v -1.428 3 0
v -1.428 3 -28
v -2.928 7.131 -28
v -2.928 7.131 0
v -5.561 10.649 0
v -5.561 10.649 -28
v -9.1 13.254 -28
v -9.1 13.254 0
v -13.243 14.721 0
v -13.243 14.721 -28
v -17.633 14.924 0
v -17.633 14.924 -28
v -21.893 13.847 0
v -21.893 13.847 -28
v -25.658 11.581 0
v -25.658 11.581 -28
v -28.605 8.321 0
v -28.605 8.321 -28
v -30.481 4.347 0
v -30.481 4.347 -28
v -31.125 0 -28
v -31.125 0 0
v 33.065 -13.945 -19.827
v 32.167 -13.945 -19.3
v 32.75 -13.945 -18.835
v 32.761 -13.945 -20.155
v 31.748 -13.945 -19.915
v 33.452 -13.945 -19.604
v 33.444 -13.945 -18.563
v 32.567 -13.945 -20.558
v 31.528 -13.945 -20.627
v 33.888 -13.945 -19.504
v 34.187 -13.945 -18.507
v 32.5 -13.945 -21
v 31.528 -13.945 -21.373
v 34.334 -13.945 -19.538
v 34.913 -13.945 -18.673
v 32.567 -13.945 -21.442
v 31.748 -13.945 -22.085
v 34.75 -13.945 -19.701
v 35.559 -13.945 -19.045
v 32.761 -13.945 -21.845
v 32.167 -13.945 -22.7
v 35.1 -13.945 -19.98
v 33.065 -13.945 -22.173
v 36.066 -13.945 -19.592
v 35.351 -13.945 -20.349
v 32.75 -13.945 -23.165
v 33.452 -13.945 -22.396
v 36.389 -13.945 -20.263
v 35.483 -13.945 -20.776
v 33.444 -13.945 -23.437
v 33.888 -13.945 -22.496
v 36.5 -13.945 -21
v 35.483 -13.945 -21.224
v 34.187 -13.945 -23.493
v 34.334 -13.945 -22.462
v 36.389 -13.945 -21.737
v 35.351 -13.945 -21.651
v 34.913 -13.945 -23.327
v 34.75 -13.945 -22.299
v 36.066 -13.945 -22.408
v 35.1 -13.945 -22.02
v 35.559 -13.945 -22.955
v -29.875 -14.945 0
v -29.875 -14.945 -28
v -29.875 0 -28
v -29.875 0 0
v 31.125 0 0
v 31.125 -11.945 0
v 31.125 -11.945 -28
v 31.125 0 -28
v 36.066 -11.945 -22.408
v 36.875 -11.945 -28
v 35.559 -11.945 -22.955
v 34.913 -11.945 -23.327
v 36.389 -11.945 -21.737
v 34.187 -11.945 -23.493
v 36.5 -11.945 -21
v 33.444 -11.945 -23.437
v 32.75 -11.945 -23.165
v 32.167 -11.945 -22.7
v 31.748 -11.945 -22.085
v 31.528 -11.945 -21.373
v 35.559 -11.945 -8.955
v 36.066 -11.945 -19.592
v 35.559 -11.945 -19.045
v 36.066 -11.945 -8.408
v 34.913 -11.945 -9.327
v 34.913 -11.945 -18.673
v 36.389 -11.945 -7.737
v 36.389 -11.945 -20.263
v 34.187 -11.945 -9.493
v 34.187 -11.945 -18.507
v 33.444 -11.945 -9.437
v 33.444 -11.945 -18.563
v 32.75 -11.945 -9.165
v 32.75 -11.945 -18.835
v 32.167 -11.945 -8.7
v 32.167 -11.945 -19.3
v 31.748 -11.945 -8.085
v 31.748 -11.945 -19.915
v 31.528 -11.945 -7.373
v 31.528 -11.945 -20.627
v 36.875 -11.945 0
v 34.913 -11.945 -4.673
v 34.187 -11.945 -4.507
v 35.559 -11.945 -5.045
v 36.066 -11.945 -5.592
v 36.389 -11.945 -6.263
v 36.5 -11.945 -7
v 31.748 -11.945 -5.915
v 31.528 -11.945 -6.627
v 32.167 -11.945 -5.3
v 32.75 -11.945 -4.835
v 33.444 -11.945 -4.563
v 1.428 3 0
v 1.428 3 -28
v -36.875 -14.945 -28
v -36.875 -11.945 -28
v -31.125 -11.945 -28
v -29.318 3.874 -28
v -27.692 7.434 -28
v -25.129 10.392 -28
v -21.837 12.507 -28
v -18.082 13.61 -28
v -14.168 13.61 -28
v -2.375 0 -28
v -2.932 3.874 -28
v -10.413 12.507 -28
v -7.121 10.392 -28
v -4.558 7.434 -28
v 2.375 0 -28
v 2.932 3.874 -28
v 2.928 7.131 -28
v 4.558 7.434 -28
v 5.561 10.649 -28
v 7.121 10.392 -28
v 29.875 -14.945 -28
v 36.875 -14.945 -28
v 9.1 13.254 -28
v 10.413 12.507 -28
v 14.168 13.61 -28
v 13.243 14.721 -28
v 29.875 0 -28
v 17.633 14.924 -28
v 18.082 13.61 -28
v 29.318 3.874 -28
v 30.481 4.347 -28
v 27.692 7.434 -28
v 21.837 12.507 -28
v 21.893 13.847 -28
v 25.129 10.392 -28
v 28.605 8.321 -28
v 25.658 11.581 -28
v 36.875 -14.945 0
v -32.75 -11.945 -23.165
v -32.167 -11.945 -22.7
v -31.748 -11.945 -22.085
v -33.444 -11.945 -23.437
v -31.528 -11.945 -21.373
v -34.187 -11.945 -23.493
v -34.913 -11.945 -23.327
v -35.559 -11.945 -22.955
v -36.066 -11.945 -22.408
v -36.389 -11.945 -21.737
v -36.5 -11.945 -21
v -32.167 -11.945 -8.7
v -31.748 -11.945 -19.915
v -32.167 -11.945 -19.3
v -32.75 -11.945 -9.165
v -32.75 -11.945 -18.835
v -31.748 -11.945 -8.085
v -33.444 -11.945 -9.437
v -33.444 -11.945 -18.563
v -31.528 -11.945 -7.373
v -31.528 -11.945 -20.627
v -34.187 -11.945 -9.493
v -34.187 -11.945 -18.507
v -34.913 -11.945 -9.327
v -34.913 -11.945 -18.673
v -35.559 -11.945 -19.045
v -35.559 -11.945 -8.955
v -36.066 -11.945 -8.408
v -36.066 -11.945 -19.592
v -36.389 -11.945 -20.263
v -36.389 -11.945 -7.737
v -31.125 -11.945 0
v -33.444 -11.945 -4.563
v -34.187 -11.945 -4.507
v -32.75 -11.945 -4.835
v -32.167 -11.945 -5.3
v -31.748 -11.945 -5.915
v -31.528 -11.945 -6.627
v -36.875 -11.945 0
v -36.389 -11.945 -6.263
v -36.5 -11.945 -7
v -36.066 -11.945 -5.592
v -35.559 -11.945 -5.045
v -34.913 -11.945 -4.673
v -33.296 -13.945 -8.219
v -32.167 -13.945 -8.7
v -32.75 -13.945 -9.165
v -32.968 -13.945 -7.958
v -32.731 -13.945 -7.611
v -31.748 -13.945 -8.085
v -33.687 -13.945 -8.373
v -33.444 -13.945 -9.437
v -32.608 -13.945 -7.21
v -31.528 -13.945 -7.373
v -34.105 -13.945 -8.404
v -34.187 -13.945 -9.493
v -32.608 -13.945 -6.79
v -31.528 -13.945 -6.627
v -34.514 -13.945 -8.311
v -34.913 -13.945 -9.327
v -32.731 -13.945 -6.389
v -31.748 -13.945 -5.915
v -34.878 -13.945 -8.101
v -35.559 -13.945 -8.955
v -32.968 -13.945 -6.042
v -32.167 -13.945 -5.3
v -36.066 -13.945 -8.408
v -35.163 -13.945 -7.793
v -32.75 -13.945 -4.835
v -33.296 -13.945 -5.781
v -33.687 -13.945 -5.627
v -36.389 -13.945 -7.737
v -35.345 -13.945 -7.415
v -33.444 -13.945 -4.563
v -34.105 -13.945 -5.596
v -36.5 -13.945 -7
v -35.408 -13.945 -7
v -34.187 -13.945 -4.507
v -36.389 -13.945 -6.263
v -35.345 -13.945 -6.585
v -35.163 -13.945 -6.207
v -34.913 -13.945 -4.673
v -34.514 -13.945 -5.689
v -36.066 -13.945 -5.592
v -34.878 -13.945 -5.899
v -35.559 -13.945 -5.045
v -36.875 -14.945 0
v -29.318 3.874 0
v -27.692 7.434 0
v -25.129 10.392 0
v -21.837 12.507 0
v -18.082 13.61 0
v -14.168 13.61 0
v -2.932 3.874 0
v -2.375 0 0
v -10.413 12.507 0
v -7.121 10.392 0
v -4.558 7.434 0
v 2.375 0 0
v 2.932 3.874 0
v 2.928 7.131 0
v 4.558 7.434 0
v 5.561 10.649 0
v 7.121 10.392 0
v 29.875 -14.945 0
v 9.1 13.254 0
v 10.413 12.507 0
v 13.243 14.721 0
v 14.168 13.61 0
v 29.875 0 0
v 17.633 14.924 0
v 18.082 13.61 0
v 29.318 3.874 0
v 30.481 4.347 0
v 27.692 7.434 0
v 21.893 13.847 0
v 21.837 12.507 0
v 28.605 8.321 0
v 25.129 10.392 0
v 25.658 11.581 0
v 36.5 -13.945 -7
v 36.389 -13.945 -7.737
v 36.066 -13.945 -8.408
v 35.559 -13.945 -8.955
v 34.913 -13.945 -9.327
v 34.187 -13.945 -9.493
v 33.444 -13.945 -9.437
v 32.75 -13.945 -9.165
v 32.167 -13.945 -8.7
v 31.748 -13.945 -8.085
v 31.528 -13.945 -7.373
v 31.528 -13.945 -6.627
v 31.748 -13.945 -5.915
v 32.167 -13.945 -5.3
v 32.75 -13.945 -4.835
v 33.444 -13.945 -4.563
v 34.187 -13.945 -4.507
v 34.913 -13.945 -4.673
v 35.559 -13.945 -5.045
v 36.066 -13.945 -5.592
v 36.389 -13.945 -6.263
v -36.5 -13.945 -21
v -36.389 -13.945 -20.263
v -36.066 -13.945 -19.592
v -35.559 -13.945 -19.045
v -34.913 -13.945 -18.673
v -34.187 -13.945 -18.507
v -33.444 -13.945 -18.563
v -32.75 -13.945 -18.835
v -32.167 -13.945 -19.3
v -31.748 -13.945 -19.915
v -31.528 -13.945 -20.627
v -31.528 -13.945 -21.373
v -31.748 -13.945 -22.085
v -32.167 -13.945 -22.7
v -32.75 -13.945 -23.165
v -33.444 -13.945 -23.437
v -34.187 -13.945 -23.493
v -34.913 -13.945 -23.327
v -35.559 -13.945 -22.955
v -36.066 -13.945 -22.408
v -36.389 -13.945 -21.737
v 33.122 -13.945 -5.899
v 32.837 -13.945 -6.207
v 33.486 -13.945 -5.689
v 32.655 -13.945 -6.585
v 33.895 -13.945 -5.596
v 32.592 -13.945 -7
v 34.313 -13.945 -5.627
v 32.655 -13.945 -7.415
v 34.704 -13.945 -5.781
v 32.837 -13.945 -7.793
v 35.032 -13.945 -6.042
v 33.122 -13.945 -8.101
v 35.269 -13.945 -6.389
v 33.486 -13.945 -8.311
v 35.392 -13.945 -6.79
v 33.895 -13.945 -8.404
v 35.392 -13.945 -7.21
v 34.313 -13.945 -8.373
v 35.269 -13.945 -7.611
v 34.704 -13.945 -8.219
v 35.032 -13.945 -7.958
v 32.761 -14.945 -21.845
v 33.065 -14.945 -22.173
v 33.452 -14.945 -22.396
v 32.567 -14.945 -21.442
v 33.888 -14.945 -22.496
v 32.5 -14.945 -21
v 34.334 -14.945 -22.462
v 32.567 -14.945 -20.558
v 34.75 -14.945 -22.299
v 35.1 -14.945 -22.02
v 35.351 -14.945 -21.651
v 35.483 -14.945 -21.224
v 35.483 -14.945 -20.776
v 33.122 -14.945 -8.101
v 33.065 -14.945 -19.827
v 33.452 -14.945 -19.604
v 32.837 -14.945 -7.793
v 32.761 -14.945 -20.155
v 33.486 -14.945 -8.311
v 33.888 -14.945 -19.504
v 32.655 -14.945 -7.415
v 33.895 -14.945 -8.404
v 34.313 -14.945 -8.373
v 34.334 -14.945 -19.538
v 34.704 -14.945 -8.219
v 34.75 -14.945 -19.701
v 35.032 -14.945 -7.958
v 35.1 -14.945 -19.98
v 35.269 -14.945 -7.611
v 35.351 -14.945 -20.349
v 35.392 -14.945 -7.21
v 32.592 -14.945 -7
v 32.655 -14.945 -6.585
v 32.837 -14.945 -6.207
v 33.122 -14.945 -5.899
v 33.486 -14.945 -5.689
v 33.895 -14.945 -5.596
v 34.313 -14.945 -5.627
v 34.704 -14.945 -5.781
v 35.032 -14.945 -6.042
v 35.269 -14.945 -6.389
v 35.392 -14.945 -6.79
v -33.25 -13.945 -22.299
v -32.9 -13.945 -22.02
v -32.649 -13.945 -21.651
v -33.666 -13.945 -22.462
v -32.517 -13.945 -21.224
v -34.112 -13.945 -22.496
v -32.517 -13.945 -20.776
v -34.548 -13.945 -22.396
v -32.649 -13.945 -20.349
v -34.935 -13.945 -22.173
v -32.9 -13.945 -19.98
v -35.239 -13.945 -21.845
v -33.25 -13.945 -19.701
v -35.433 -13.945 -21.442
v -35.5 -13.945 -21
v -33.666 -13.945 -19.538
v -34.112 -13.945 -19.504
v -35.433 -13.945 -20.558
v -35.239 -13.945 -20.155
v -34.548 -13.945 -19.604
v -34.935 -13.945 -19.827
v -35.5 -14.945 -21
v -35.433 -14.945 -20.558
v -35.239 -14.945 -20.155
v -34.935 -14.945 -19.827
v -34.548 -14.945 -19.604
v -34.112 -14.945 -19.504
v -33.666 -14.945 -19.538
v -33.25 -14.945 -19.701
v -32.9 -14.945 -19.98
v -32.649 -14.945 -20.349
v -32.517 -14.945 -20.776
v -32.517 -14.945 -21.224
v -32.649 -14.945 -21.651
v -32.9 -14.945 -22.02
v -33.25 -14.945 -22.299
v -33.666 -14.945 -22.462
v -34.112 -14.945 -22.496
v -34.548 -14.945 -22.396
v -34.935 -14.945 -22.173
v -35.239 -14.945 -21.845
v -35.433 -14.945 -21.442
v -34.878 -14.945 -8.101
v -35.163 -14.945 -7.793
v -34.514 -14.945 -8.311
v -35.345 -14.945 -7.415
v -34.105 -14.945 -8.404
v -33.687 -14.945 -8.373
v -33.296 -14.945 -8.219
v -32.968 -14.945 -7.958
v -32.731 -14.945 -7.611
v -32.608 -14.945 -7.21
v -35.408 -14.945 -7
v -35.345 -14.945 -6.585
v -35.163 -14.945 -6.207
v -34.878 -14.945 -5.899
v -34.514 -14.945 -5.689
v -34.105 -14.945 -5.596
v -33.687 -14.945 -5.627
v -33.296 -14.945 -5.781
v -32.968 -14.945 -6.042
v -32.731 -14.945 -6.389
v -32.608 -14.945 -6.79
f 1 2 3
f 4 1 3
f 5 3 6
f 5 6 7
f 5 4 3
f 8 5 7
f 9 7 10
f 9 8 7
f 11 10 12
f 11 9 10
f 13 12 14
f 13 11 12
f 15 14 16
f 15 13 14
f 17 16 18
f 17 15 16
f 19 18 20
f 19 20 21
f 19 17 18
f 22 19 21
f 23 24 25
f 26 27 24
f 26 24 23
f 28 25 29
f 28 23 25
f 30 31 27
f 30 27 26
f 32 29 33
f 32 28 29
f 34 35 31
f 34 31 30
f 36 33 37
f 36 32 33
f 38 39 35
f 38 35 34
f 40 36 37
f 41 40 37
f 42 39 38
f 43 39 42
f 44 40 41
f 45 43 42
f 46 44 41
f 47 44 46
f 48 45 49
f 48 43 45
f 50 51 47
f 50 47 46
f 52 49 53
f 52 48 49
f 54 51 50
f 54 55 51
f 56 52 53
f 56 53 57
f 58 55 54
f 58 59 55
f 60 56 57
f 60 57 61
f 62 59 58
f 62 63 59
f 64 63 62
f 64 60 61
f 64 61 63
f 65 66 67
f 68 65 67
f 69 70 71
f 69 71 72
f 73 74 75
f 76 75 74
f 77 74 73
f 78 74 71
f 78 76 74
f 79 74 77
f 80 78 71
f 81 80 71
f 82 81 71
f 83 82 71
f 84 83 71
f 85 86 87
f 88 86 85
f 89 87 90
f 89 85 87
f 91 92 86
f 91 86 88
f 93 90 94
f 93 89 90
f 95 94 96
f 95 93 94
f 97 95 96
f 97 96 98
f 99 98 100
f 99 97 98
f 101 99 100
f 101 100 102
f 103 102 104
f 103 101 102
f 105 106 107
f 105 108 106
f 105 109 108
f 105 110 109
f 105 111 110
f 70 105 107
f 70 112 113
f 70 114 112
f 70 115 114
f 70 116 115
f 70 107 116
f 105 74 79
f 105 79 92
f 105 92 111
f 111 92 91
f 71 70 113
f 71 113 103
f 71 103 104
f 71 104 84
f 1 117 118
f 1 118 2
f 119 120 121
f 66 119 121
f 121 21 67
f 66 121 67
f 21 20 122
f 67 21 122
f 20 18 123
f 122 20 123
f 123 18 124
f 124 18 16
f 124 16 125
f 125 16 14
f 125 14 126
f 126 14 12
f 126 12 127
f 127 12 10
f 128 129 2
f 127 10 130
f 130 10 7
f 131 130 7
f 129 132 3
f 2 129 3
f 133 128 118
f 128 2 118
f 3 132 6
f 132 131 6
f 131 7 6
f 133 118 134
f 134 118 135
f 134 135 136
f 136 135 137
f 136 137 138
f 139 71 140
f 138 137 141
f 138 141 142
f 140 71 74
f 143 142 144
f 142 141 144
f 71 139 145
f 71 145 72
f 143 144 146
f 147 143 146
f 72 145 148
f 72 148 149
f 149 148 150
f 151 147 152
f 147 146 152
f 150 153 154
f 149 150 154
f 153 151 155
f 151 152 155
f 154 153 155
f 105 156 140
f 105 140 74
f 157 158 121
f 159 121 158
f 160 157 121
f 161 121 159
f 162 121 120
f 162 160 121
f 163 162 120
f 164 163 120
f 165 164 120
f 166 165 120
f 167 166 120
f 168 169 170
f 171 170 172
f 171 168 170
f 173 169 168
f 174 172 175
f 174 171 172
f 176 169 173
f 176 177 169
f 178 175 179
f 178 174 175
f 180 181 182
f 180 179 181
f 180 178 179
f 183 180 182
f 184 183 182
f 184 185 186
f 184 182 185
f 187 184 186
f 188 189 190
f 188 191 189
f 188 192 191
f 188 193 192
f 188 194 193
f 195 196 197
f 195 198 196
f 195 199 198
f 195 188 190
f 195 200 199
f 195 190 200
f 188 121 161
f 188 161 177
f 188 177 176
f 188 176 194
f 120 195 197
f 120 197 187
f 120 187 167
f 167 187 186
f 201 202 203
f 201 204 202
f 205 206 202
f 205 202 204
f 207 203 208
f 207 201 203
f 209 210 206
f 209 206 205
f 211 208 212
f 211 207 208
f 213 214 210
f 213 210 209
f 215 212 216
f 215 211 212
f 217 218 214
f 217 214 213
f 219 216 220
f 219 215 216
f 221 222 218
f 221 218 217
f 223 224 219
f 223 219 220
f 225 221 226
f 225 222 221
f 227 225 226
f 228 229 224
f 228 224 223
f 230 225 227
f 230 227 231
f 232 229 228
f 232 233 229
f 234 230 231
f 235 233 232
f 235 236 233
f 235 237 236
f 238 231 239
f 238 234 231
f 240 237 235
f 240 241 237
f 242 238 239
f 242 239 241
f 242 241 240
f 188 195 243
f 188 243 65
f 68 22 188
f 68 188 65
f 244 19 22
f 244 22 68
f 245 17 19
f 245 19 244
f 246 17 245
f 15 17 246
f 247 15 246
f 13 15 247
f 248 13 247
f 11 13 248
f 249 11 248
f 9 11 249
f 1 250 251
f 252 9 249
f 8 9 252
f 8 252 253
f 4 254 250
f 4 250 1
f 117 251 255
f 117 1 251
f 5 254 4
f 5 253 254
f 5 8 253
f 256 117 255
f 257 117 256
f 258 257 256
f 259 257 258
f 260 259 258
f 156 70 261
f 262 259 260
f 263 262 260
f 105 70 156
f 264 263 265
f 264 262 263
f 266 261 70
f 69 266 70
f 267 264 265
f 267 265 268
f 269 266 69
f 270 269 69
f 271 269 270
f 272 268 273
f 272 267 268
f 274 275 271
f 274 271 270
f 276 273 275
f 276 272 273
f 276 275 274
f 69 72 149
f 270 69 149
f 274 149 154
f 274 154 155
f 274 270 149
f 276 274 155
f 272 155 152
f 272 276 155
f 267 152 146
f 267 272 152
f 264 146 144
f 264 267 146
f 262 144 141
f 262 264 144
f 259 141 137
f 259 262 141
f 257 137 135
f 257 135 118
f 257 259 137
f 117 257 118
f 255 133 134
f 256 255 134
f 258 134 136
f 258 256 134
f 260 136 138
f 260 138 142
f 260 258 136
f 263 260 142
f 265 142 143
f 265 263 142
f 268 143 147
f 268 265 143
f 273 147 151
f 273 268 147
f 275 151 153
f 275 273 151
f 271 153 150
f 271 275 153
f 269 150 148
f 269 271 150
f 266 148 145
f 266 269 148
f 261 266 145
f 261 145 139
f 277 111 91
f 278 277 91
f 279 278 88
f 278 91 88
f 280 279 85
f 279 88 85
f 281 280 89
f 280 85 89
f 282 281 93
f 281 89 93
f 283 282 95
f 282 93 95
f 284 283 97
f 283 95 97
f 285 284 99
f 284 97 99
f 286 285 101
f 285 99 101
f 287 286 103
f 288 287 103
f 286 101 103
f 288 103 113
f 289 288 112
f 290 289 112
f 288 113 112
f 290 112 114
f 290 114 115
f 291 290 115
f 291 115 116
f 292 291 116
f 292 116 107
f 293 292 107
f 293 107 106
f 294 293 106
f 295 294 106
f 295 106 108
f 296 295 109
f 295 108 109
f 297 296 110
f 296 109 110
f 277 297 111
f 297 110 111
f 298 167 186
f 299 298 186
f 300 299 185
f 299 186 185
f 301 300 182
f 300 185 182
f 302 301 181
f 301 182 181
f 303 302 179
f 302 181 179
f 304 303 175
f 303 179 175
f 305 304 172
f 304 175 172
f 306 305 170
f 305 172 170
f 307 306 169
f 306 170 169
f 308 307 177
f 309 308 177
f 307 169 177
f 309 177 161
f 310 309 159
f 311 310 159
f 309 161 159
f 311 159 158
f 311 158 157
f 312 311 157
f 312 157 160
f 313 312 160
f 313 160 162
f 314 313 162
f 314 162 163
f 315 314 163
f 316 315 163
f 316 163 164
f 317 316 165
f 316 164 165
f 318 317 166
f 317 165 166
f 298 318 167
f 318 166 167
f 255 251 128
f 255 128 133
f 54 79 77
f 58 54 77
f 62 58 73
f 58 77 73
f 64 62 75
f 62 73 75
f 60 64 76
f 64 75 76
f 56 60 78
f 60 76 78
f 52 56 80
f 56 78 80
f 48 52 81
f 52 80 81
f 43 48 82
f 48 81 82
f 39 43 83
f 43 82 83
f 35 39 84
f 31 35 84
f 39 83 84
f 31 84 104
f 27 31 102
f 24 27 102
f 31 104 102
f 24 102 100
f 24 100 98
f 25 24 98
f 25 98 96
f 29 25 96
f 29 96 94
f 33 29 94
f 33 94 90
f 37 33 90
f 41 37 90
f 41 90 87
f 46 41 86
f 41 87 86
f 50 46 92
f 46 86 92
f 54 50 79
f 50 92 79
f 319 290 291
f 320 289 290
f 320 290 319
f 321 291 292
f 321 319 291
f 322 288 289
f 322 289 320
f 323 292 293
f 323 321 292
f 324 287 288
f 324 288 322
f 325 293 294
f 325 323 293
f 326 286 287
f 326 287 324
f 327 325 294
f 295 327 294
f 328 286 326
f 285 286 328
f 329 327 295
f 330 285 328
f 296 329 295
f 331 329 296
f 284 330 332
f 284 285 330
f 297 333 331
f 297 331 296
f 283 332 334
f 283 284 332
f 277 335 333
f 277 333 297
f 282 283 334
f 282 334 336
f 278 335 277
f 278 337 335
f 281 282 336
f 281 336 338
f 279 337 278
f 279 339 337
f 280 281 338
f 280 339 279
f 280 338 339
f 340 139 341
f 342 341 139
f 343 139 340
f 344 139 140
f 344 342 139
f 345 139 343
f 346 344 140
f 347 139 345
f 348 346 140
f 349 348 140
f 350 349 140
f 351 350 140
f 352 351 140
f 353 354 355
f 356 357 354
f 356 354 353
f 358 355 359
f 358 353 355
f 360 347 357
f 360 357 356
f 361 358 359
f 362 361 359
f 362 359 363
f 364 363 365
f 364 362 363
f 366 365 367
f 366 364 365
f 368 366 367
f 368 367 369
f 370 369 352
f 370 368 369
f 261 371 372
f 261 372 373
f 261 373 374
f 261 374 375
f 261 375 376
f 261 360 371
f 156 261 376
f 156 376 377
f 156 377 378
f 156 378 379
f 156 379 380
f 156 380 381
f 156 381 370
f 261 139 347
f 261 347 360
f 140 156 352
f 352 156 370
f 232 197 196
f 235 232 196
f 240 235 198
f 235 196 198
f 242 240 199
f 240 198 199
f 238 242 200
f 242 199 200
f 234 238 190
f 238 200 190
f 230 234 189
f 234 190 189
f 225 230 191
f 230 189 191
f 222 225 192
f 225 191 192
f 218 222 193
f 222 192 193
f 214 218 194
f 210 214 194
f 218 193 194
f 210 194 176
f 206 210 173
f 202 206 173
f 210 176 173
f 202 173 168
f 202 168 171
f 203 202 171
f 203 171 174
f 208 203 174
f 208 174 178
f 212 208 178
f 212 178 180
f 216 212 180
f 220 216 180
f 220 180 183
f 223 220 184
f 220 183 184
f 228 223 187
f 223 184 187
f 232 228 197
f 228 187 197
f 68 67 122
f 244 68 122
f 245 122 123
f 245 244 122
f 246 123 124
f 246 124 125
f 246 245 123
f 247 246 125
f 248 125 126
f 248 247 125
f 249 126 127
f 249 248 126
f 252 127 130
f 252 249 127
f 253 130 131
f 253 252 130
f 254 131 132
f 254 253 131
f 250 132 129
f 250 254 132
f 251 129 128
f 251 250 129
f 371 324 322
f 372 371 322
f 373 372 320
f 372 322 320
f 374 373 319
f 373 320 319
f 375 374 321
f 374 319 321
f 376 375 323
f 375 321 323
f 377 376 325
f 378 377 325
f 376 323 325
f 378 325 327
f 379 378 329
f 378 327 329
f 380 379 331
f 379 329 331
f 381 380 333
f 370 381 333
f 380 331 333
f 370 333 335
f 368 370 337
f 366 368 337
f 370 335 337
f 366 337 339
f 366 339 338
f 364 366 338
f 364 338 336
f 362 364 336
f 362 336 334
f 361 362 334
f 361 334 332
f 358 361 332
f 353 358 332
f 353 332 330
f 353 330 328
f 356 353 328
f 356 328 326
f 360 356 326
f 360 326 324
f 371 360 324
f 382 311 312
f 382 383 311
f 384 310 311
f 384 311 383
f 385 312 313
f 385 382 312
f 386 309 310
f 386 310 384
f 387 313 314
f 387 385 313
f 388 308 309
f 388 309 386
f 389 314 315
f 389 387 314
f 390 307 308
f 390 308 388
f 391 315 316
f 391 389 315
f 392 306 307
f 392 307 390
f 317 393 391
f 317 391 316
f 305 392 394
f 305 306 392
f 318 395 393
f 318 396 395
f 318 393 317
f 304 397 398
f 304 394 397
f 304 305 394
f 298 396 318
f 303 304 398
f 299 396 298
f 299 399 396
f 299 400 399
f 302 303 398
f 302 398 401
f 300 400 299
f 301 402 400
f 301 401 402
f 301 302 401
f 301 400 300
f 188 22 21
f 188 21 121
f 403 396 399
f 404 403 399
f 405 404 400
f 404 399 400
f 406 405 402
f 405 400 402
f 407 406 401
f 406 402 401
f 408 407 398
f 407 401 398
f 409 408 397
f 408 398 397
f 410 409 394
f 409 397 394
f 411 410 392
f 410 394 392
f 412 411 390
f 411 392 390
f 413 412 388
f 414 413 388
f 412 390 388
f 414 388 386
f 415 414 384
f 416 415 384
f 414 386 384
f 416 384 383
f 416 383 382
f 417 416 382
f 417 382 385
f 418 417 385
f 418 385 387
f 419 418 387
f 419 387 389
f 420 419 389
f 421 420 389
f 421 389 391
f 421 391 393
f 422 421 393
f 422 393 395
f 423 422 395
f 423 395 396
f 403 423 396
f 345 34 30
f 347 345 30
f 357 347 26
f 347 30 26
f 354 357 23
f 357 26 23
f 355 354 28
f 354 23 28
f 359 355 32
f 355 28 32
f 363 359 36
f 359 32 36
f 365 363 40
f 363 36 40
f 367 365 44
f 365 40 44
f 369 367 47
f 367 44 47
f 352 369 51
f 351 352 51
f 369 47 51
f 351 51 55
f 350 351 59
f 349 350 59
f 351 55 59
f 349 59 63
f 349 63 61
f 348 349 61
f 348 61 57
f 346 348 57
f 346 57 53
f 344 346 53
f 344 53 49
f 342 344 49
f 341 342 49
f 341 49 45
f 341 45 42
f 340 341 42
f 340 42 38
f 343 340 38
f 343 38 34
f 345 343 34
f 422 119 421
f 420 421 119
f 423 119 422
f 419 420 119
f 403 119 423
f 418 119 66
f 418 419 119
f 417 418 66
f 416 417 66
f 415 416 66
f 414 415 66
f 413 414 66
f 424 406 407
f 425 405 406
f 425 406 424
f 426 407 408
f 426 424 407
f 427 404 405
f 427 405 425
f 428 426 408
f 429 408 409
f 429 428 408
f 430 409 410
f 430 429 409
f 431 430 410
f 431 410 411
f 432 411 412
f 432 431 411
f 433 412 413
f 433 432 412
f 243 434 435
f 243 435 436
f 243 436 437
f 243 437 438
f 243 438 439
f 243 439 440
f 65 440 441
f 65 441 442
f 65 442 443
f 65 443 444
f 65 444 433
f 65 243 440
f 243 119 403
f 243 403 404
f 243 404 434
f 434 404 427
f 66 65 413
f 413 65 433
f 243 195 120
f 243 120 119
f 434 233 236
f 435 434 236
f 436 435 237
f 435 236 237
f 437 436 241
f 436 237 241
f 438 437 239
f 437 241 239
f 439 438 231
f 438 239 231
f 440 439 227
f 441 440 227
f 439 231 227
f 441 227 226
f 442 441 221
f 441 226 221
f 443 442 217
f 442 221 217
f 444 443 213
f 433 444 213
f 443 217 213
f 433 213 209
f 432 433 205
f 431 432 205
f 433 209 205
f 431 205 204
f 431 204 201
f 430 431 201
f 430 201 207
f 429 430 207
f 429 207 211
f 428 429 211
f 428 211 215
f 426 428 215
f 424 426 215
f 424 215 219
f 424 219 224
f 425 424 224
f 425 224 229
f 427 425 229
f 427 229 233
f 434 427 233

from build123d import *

# Parameters (mm, degrees)
SALIENTE_EXTRUIR1_DEPTH = 28
CROQUIS2_R              = 2.5
CROQUIS2_R_2            = 1.5
CROQUIS2_R_3            = 1.407949101
CORTAR_EXTRUIR1_DEPTH   = 2
CROQUIS3_R              = 1.407949101
CROQUIS3_R_2            = 1.5
CORTAR_EXTRUIR2_DEPTH   = 54.570618198
CROQUIS4_R              = 1.407949101
CROQUIS4_R_2            = 1.5
CORTAR_EXTRUIR3_DEPTH   = 54.570618198


with BuildPart() as part:
    # Croquis1 → Saliente-Extruir1 (new body)
    with BuildSketch(Plane.XY):
        with BuildLine():
            ThreePointArc((-29.875, 0), (-16.125, 13.75), (-2.375, 0))
            Line((-2.375, 0), (-1.125, 0))
            Line((-1.125, 0), (1.125, 0))
            Line((1.125, 0), (2.375, 0))
            ThreePointArc((2.375, 0), (16.125, 13.75), (29.875, 0))
            Line((29.875, 0), (29.875, -9.945231658))
            Line((29.875, -9.945231658), (29.875, -14.945231658))
            Line((29.875, -14.945231658), (36.875, -14.945231658))
            Line((36.875, -14.945231658), (36.875, -11.945231658))
            Line((36.875, -11.945231658), (31.125, -11.945231658))
            Line((31.125, -11.945231658), (31.125, 0))
            ThreePointArc((31.125, 0), (17.63263443, 14.924042295), (1.428061543, 3))
            Line((1.428061543, 3), (-1.428061543, 3))
            ThreePointArc((-1.428061543, 3), (-17.63263443, 14.924042295), (-31.125, 0))
            Line((-31.125, 0), (-31.125, -11.945231658))
            Line((-31.125, -11.945231658), (-36.875, -11.945231658))
            Line((-36.875, -11.945231658), (-36.875, -14.945231658))
            Line((-36.875, -14.945231658), (-29.875, -14.945231658))
            Line((-29.875, -14.945231658), (-29.875, -9.945231658))
            Line((-29.875, -9.945231658), (-29.875, 0))
        make_face()
    extrude(amount=-SALIENTE_EXTRUIR1_DEPTH)

    # Croquis2 → Cortar-Extruir1 (cut)
    # profile 1 of 4: a face of its own
    with BuildSketch(Plane(origin=(0, -11.945231658, 0), x_dir=(1, 0, 0), z_dir=(0, 1, 0))):
        with Locations(Location((-34, 21, 0), (0, 0, 180))):
            Circle(CROQUIS2_R)
        with Locations(Location((-34, 21, 0), (0, 0, 180))):
            Circle(CROQUIS2_R_2, mode=Mode.SUBTRACT)
    # profile 2 of 4: a face of its own
    with BuildSketch(Plane(origin=(0, -11.945231658, 0), x_dir=(1, 0, 0), z_dir=(0, 1, 0))):
        with Locations(Location((-34, 7, 0), (0, 0, 180))):
            Circle(CROQUIS2_R)
        with Locations(Location((-34, 7, 0), (0, 0, 180))):
            Circle(CROQUIS2_R_3, mode=Mode.SUBTRACT)
    # profile 3 of 4: a face of its own
    with BuildSketch(Plane(origin=(0, -11.945231658, 0), x_dir=(1, 0, 0), z_dir=(0, 1, 0))):
        with Locations((34, 7)):
            Circle(CROQUIS2_R)
        with Locations((34, 7)):
            Circle(CROQUIS2_R_3, mode=Mode.SUBTRACT)
    # profile 4 of 4: a face of its own
    with BuildSketch(Plane(origin=(0, -11.945231658, 0), x_dir=(1, 0, 0), z_dir=(0, 1, 0))):
        with Locations((34, 21)):
            Circle(CROQUIS2_R)
        with Locations((34, 21)):
            Circle(CROQUIS2_R_2, mode=Mode.SUBTRACT)
    extrude(amount=-CORTAR_EXTRUIR1_DEPTH, mode=Mode.SUBTRACT)

    # Croquis3 → Cortar-Extruir2 (cut, through all)
    with BuildSketch(Plane(origin=(0, -11.945231658, 0), x_dir=(1, 0, 0), z_dir=(0, 1, 0))):
        with Locations(Location((-34, 7, 0), (0, 0, 180))):
            Circle(CROQUIS3_R)
        with Locations(Location((-34, 21, 0), (0, 0, 180))):
            Circle(CROQUIS3_R_2)
    extrude(amount=-CORTAR_EXTRUIR2_DEPTH, mode=Mode.SUBTRACT)

    # Croquis4 → Cortar-Extruir3 (cut, through all)
    with BuildSketch(Plane(origin=(0, -11.945231658, 0), x_dir=(1, 0, 0), z_dir=(0, 1, 0))):
        with Locations(Location((34, 7, 0), (0, 0, 180))):
            Circle(CROQUIS4_R)
        with Locations(Location((34, 21, 0), (0, 0, 180))):
            Circle(CROQUIS4_R_2)
    extrude(amount=-CORTAR_EXTRUIR3_DEPTH, mode=Mode.SUBTRACT)


solid = part.part
